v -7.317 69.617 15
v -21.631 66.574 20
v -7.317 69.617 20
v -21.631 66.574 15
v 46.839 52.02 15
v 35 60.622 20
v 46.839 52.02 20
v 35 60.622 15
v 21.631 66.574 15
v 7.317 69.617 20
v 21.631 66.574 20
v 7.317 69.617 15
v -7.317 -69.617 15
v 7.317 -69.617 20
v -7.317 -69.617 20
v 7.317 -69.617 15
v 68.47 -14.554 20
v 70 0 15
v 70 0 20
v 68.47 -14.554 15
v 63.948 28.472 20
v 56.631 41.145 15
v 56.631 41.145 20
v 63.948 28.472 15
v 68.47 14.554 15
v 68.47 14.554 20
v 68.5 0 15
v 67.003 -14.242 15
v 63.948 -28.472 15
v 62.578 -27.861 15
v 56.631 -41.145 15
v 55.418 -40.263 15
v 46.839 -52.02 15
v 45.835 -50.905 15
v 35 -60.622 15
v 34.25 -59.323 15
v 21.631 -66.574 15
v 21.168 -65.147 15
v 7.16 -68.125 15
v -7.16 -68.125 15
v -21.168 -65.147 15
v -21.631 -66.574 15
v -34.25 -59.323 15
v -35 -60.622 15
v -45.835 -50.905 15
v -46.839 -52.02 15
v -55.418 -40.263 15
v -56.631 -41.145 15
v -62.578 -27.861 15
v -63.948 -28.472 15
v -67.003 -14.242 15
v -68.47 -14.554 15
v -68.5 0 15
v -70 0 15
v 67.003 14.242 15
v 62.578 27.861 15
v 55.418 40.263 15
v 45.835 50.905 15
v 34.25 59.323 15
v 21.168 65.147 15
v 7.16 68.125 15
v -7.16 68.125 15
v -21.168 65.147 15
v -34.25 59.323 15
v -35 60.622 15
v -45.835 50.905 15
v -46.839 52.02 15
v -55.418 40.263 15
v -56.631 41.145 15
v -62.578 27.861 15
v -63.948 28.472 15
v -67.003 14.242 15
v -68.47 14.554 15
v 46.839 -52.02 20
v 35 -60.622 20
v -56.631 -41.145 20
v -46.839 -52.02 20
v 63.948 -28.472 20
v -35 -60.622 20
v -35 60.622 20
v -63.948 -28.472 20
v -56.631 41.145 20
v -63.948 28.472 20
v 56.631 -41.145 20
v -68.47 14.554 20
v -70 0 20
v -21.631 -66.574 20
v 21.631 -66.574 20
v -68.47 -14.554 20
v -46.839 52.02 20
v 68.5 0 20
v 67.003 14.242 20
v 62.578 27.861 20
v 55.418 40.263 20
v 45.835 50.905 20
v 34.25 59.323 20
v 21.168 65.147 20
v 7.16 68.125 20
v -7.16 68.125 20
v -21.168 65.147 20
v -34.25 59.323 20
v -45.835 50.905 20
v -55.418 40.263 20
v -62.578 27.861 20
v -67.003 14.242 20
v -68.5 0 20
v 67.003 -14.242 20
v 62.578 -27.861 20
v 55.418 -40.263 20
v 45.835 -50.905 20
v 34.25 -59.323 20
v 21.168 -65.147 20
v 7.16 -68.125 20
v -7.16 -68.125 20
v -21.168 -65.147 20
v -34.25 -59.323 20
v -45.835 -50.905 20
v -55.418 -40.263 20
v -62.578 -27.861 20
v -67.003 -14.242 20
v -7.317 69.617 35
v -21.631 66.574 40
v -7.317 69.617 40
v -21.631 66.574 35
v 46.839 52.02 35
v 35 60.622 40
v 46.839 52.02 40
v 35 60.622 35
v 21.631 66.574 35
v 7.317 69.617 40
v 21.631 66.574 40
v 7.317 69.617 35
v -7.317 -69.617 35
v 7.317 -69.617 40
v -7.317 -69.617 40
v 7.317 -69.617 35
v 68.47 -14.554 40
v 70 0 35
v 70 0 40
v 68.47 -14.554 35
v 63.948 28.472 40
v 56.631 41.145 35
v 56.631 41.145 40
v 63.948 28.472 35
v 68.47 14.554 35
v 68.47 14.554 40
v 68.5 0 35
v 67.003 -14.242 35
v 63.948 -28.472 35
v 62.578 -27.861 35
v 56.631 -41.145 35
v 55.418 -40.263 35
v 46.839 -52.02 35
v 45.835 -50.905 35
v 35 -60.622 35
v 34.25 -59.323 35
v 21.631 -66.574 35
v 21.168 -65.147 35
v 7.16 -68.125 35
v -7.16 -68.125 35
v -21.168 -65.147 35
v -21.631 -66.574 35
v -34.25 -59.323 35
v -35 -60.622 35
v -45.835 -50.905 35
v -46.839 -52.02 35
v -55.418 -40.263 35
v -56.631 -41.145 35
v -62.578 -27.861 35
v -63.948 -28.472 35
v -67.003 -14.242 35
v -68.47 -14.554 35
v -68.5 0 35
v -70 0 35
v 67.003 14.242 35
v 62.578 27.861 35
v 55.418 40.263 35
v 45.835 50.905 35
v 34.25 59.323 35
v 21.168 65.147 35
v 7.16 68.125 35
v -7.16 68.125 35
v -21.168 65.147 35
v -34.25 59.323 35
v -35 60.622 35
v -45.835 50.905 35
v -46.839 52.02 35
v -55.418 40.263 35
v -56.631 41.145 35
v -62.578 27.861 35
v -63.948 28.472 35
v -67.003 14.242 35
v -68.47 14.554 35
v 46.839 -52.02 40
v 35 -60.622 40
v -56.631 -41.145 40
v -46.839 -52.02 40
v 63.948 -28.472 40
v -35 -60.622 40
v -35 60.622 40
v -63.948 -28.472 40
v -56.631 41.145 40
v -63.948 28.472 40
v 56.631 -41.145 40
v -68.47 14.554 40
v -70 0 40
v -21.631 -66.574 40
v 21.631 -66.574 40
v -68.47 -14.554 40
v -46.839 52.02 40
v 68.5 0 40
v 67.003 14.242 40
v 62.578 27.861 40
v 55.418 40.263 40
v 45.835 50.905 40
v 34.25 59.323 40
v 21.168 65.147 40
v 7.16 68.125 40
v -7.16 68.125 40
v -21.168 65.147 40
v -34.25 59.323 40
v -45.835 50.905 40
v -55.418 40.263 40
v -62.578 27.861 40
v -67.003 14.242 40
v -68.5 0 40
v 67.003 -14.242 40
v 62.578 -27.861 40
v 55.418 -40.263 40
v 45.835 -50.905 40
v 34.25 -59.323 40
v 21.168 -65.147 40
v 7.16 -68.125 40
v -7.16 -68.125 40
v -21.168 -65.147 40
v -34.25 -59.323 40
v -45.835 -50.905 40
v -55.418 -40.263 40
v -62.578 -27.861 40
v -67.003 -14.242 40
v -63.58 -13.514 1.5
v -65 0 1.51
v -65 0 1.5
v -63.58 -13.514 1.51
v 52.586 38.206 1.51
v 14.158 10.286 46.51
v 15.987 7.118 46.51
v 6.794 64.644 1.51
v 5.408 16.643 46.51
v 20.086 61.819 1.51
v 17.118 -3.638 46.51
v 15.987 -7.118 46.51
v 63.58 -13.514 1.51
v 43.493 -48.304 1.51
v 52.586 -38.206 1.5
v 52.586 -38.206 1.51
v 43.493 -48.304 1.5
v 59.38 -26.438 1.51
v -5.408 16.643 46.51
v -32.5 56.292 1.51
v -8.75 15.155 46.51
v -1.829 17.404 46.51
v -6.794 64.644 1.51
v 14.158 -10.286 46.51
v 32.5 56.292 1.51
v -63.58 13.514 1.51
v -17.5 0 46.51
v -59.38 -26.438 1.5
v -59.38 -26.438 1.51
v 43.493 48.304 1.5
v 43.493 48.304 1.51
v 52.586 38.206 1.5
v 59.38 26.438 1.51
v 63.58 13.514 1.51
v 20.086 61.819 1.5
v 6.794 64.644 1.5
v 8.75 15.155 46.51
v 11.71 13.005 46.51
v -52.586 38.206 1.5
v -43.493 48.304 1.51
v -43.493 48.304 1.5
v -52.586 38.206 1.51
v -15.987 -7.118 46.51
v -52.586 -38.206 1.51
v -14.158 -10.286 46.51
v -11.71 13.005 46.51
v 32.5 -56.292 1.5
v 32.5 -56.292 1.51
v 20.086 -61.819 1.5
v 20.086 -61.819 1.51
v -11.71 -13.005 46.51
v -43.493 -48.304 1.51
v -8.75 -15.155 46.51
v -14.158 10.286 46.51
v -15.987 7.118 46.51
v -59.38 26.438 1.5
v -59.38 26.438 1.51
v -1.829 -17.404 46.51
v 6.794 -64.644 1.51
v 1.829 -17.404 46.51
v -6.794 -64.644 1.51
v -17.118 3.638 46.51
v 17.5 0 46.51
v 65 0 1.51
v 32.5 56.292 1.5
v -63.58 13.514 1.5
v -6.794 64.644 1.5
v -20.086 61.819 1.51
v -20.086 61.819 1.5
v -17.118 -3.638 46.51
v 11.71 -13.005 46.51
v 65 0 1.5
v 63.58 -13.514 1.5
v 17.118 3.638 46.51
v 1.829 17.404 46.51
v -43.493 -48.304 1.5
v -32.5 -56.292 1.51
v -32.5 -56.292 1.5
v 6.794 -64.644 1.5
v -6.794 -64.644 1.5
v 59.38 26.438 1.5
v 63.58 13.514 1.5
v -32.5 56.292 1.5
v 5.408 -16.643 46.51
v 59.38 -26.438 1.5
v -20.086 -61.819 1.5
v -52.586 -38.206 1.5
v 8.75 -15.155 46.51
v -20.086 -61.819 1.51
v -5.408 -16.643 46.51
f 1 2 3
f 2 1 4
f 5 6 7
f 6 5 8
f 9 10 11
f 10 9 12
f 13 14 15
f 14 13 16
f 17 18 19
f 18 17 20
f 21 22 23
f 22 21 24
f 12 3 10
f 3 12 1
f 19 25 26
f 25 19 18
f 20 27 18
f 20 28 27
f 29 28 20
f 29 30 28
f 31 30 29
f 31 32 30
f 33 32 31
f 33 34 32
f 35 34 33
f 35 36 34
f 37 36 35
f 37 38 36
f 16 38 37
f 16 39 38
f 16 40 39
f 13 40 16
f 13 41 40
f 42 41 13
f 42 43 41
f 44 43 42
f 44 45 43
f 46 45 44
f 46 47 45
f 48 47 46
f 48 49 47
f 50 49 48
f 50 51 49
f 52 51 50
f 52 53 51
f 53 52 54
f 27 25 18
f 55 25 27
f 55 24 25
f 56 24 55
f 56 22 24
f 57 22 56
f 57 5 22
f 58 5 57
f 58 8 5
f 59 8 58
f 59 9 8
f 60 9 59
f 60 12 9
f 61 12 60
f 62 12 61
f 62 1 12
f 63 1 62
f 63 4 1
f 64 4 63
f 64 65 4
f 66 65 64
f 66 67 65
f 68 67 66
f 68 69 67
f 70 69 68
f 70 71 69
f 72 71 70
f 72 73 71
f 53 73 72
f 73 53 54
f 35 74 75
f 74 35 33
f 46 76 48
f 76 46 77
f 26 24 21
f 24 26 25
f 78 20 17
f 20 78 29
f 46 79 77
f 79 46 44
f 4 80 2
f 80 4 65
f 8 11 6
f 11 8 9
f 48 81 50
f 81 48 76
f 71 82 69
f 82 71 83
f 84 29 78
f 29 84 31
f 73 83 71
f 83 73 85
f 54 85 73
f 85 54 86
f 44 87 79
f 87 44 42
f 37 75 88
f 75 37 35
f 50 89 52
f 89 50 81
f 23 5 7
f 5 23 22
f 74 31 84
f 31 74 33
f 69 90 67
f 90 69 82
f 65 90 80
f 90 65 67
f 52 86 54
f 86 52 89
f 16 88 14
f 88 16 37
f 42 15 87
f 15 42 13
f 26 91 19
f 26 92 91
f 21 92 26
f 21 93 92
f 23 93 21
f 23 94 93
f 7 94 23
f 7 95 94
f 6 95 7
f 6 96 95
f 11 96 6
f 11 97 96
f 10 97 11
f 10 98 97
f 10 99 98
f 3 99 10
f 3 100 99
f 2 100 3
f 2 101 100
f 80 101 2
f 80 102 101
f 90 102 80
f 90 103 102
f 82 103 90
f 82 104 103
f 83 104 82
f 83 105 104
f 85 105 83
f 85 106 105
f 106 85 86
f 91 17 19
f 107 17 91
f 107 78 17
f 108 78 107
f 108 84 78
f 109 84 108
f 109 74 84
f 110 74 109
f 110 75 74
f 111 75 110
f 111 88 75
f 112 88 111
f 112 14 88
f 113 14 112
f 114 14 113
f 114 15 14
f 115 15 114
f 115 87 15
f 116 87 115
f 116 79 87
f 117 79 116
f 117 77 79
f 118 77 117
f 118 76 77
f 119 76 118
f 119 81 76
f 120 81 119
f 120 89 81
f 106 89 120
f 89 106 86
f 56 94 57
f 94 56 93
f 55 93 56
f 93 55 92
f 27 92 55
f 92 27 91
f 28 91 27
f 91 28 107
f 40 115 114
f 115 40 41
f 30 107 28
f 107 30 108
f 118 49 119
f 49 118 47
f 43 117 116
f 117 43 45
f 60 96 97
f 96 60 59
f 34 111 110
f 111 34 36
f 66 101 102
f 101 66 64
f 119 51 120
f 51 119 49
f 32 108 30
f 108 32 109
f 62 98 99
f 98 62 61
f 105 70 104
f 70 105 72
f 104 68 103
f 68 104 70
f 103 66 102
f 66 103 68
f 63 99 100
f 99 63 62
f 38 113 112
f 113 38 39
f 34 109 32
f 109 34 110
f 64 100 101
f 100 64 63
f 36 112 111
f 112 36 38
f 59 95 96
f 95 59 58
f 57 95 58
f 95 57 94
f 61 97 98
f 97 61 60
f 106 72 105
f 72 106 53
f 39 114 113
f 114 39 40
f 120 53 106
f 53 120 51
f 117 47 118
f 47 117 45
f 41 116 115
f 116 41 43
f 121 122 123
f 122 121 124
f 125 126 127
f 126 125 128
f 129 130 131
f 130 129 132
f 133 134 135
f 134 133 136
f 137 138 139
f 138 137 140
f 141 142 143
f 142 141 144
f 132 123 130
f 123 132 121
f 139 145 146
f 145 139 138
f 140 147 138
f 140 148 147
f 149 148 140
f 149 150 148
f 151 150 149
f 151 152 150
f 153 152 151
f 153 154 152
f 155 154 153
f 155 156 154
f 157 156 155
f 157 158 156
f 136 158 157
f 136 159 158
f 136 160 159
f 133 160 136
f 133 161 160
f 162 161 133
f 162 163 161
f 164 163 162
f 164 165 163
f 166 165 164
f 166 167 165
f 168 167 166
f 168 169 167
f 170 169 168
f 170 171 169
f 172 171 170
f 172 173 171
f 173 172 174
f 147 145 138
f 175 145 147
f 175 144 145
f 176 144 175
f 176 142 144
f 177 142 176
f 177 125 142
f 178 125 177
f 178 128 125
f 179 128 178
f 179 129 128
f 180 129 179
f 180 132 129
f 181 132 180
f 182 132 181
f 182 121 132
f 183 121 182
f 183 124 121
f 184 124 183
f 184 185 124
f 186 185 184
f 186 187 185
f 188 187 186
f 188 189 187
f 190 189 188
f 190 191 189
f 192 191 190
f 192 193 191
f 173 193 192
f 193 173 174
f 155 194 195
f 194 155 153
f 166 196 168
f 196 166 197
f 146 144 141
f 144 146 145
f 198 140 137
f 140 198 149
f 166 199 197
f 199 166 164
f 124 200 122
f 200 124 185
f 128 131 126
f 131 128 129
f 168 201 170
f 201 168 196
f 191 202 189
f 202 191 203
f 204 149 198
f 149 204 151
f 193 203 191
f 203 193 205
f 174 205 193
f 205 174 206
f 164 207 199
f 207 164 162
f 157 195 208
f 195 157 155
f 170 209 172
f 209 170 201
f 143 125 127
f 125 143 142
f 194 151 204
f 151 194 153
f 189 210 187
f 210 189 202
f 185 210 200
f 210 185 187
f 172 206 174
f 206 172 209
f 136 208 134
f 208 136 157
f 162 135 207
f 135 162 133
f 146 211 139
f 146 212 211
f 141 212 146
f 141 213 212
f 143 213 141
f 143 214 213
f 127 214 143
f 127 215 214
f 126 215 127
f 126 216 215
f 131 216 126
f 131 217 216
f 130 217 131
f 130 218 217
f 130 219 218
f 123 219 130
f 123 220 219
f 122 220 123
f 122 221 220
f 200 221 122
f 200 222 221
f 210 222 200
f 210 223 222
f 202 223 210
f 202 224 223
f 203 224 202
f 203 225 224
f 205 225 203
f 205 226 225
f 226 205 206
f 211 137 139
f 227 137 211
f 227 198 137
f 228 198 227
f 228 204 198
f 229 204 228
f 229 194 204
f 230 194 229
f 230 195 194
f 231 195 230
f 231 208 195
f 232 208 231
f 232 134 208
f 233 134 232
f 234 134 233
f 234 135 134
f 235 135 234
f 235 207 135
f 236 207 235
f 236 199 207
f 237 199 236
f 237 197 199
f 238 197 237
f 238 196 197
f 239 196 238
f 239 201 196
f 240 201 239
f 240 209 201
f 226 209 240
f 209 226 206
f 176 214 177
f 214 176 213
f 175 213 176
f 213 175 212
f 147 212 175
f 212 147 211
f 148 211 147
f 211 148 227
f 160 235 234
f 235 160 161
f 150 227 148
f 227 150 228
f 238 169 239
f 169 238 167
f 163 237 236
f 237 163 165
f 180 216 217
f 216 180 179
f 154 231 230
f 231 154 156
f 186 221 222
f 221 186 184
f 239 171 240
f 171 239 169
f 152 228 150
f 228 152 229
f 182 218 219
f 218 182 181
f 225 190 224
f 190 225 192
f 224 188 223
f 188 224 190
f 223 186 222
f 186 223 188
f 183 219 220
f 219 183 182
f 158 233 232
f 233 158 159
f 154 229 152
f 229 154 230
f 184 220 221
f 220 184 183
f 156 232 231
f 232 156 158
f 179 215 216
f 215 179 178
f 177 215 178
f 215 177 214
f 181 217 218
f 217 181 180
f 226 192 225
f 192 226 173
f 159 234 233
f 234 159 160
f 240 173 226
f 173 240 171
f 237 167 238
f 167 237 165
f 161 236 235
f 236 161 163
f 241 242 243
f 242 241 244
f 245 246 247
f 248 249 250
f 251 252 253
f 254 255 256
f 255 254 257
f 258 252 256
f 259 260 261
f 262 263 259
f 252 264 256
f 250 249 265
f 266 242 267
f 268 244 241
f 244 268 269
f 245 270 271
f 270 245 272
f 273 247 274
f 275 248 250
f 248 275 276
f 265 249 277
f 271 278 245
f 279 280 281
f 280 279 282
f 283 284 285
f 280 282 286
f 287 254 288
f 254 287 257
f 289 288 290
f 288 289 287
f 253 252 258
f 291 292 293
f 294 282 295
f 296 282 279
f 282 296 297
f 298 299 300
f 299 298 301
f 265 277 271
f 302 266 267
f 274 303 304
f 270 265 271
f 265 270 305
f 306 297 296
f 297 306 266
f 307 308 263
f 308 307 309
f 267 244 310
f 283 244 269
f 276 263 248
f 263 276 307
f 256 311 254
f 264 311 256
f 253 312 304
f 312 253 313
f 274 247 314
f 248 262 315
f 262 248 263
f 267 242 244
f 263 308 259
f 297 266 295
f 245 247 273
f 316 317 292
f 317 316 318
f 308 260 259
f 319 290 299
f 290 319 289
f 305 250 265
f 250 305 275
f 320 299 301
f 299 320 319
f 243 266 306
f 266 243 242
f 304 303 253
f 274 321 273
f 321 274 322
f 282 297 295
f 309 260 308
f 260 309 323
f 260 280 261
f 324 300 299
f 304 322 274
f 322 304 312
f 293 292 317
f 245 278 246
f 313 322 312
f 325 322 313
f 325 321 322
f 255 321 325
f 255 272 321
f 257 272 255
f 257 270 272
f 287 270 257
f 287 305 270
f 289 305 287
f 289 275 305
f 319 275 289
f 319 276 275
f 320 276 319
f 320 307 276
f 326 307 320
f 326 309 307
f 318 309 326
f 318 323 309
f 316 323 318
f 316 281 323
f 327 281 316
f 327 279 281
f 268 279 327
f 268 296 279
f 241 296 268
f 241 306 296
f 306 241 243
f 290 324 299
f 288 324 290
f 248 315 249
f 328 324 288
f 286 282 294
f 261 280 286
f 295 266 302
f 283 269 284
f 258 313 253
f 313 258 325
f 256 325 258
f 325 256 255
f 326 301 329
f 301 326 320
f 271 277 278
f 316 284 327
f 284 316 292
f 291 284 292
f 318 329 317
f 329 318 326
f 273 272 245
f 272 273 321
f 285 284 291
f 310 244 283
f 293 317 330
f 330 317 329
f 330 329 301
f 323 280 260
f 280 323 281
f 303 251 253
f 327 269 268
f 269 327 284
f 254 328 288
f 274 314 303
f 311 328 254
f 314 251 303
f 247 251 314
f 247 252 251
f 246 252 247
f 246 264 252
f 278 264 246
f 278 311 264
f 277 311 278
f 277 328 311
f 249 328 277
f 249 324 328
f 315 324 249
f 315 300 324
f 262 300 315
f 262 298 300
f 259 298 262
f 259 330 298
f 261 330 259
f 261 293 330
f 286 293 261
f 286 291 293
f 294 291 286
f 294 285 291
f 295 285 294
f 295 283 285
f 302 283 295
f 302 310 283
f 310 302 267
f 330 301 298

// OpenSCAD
material_thickness = 3;
height = 50;

led_positions = [15, 35];


module Top()
{
	color("Brown")
		linear_extrude(height=material_thickness, center=true)
			difference()
			{
				import (file="front.dxf", layer="cut");
				import (file="front.dxf", layer="cut_brackets");
			}
}

module TopPewter()
{
	color("Silver")
		linear_extrude(height=material_thickness, center=true)
			import (file="front_pewter.dxf", layer="cut");
}

module TopAcrylic()
{
	color("Cyan", 0.5)
		linear_extrude(height=material_thickness, center=true)
			import (file="front_acrylic.dxf", layer="cut");
}

module Side(dist)
{
	color("Red")
		rotate([90, 0, 0])
			translate([0, 0, dist])
				linear_extrude(height=material_thickness, center=true)
					import (file="side.dxf", layer="cut");
}

module Bottom()
{
	color("Brown")
		linear_extrude(height=material_thickness, center=true)
			difference()
			{
				import (file="rear.dxf", layer="cut");
				import (file="rear.dxf", layer="cut_brackets");
			}
}

module Reflector(inner, outer, height)
{
	color("Silver")
		hull()
		{
			translate([0, 0, height])
				cylinder(r=inner/2, h=0.01);
			cylinder(r=outer/2, h=0.01);
		}
}

module LEDRing(led_outer=140, led_width=5, led_thickness=3)
{
	color("White")
		difference()
		{
			cylinder(r=led_outer/2, h=led_width);
				translate([0, 0, -0.1])
			cylinder(r=(led_outer-led_thickness)/2, h=led_width+0.2);
		}
}


explode = 1;
side_explode = 1;


Bottom();

translate([0, 0, explode*(material_thickness/2)])
	Reflector(35, 130, 45);

for(i = led_positions)
	translate([0, 0, explode*i])
		LEDRing();

translate([0, 0, explode*((height+material_thickness)/2)])
	for(i = [0:7])
		rotate([0, 0, i * (360 / 8)])
			Side(side_explode*75);

translate([0, 0, explode*height])
	TopAcrylic();

translate([0, 0, explode*(height+material_thickness)])
{
	Top();
	TopPewter();
}
